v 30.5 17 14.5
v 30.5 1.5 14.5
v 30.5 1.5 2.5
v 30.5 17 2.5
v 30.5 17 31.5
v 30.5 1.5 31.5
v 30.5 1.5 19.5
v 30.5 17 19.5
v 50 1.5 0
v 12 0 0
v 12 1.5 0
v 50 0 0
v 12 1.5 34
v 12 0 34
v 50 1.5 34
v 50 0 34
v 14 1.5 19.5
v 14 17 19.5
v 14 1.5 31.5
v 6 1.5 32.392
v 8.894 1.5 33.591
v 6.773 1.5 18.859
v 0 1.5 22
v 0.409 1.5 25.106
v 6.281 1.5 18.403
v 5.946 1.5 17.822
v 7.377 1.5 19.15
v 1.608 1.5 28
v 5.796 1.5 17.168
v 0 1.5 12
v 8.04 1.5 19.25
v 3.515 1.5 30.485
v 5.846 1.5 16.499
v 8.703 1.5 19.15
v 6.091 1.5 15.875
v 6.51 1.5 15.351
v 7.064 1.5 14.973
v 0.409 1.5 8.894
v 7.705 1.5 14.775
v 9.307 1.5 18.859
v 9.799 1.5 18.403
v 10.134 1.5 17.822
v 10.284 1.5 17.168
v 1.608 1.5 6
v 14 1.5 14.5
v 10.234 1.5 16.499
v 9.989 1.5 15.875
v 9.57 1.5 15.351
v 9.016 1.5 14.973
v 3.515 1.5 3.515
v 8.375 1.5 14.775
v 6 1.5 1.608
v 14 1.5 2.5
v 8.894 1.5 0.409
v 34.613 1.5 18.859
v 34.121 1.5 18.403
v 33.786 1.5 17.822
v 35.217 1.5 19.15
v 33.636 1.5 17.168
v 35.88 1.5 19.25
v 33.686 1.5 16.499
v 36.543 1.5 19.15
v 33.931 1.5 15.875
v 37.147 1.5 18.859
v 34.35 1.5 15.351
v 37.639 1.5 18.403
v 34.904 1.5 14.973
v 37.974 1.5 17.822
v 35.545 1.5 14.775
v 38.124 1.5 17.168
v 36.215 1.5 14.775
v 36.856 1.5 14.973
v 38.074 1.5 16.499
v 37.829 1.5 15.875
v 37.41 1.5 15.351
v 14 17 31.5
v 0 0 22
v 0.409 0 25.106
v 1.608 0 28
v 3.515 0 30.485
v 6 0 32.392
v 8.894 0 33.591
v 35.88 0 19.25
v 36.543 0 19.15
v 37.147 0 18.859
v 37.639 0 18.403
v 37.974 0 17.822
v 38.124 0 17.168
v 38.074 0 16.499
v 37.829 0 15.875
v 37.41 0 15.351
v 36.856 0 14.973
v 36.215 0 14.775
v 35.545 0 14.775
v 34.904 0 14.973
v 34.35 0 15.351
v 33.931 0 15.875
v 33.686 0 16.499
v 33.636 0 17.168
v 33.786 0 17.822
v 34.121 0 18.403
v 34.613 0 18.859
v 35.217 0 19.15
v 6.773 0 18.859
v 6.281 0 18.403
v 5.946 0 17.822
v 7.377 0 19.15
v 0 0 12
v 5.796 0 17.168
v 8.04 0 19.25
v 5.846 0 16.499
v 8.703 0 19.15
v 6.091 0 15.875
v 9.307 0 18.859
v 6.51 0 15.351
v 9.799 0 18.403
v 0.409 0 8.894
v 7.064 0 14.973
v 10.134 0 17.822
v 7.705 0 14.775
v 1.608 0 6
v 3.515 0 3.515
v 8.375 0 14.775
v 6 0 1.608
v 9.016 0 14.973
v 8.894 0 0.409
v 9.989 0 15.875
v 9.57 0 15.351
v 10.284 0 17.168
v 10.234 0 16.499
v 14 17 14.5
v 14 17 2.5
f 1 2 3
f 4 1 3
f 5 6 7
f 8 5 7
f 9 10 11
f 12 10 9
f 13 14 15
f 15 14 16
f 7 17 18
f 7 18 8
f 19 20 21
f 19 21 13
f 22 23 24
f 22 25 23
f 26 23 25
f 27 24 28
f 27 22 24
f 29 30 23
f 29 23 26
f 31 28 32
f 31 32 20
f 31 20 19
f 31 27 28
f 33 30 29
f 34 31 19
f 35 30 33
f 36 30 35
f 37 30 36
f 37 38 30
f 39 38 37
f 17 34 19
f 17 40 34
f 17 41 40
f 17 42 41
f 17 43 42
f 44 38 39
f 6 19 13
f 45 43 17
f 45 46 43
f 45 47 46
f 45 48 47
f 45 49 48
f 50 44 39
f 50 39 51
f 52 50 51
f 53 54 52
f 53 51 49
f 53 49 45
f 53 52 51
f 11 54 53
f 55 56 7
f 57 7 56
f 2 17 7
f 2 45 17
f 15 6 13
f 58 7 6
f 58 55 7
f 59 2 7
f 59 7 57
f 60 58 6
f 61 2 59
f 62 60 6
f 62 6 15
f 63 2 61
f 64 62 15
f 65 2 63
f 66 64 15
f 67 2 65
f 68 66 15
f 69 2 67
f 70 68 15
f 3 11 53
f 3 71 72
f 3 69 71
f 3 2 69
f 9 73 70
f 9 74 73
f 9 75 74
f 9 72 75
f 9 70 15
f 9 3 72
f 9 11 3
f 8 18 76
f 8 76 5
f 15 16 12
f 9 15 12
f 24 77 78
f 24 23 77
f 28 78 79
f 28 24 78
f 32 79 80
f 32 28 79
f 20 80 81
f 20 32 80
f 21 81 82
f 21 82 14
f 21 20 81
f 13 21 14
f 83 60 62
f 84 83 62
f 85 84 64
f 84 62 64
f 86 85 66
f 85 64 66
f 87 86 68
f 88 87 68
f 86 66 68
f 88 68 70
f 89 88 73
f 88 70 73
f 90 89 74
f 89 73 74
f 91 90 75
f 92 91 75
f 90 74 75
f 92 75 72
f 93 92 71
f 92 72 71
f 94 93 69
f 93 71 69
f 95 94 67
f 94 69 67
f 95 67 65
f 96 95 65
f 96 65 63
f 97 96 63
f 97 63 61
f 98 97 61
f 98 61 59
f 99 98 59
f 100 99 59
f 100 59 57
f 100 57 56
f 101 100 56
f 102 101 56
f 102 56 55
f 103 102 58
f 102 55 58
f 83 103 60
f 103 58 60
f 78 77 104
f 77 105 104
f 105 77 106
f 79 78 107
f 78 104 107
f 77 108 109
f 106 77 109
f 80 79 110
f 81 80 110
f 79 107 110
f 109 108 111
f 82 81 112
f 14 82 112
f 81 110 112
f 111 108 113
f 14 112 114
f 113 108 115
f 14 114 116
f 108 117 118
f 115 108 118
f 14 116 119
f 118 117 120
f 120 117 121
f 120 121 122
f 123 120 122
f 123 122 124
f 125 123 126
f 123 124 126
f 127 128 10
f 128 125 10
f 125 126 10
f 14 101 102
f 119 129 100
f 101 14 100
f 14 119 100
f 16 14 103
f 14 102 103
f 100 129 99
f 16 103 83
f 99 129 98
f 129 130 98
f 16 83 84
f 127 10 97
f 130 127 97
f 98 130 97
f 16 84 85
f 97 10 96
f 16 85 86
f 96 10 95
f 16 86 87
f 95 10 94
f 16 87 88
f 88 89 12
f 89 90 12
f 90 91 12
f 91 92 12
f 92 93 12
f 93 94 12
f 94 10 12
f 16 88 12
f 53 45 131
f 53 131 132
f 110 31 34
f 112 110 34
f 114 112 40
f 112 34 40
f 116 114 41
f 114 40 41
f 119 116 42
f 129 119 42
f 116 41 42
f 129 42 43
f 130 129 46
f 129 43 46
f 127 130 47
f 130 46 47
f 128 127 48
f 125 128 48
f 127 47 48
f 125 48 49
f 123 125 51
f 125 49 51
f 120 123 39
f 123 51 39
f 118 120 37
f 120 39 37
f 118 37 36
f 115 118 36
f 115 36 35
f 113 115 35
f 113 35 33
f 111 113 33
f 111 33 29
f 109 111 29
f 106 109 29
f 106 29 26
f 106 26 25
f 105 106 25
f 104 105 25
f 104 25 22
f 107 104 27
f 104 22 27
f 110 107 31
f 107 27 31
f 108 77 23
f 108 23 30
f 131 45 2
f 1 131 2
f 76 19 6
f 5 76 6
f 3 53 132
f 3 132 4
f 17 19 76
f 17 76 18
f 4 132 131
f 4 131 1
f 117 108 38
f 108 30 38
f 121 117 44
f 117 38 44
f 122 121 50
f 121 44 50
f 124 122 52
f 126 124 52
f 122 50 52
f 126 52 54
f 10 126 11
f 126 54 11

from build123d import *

# Parameters (mm, degrees)
SKETCH1_W           = 50
SKETCH1_H           = 34
BOSS_EXTRUDE1_DEPTH = 1.5
FILLET1_R           = 12
SKETCH2_R           = 2.25
CUT_EXTRUDE1_DEPTH  = 1.5
SKETCH3_W           = 16.5
SKETCH3_H           = 12
BOSS_EXTRUDE2_DEPTH = 15.5


with BuildPart() as part:
    # Sketch1 → Boss-Extrude1 (new body)
    with BuildSketch(Plane(origin=(0, 0, 0), x_dir=(1, 0, 0), z_dir=(0, 1, 0))):
        with Locations((25, -17)):
            Rectangle(SKETCH1_W, SKETCH1_H)
    extrude(amount=BOSS_EXTRUDE1_DEPTH)

    # Fillet1
    fillet1_edges = [part.edges().sort_by_distance(p)[0] for p in [
        (0, 0.75, 0),
        (0, 0.75, 34),
    ]]
    fillet(fillet1_edges, radius=FILLET1_R)

    # Sketch2 → Cut-Extrude1 (cut)
    with BuildSketch(Plane(origin=(0, 1.5, 0), x_dir=(1, 0, 0), z_dir=(0, 1, 0))):
        with Locations(Location((8.04, -17, 0), (0, 0, 270))):
            Circle(SKETCH2_R)
        with Locations(Location((35.88, -17, 0), (0, 0, 270))):
            Circle(SKETCH2_R)
    extrude(amount=-CUT_EXTRUDE1_DEPTH, mode=Mode.SUBTRACT)

    # Sketch3 → Boss-Extrude2 (add)
    with BuildSketch(Plane(origin=(0, 1.5, 0), x_dir=(1, 0, 0), z_dir=(0, 1, 0))):
        with Locations((22.25, -8.5)):
            Rectangle(SKETCH3_W, SKETCH3_H)
        with Locations((22.25, -25.5)):
            Rectangle(SKETCH3_W, SKETCH3_H)
    extrude(amount=BOSS_EXTRUDE2_DEPTH)


solid = part.part
